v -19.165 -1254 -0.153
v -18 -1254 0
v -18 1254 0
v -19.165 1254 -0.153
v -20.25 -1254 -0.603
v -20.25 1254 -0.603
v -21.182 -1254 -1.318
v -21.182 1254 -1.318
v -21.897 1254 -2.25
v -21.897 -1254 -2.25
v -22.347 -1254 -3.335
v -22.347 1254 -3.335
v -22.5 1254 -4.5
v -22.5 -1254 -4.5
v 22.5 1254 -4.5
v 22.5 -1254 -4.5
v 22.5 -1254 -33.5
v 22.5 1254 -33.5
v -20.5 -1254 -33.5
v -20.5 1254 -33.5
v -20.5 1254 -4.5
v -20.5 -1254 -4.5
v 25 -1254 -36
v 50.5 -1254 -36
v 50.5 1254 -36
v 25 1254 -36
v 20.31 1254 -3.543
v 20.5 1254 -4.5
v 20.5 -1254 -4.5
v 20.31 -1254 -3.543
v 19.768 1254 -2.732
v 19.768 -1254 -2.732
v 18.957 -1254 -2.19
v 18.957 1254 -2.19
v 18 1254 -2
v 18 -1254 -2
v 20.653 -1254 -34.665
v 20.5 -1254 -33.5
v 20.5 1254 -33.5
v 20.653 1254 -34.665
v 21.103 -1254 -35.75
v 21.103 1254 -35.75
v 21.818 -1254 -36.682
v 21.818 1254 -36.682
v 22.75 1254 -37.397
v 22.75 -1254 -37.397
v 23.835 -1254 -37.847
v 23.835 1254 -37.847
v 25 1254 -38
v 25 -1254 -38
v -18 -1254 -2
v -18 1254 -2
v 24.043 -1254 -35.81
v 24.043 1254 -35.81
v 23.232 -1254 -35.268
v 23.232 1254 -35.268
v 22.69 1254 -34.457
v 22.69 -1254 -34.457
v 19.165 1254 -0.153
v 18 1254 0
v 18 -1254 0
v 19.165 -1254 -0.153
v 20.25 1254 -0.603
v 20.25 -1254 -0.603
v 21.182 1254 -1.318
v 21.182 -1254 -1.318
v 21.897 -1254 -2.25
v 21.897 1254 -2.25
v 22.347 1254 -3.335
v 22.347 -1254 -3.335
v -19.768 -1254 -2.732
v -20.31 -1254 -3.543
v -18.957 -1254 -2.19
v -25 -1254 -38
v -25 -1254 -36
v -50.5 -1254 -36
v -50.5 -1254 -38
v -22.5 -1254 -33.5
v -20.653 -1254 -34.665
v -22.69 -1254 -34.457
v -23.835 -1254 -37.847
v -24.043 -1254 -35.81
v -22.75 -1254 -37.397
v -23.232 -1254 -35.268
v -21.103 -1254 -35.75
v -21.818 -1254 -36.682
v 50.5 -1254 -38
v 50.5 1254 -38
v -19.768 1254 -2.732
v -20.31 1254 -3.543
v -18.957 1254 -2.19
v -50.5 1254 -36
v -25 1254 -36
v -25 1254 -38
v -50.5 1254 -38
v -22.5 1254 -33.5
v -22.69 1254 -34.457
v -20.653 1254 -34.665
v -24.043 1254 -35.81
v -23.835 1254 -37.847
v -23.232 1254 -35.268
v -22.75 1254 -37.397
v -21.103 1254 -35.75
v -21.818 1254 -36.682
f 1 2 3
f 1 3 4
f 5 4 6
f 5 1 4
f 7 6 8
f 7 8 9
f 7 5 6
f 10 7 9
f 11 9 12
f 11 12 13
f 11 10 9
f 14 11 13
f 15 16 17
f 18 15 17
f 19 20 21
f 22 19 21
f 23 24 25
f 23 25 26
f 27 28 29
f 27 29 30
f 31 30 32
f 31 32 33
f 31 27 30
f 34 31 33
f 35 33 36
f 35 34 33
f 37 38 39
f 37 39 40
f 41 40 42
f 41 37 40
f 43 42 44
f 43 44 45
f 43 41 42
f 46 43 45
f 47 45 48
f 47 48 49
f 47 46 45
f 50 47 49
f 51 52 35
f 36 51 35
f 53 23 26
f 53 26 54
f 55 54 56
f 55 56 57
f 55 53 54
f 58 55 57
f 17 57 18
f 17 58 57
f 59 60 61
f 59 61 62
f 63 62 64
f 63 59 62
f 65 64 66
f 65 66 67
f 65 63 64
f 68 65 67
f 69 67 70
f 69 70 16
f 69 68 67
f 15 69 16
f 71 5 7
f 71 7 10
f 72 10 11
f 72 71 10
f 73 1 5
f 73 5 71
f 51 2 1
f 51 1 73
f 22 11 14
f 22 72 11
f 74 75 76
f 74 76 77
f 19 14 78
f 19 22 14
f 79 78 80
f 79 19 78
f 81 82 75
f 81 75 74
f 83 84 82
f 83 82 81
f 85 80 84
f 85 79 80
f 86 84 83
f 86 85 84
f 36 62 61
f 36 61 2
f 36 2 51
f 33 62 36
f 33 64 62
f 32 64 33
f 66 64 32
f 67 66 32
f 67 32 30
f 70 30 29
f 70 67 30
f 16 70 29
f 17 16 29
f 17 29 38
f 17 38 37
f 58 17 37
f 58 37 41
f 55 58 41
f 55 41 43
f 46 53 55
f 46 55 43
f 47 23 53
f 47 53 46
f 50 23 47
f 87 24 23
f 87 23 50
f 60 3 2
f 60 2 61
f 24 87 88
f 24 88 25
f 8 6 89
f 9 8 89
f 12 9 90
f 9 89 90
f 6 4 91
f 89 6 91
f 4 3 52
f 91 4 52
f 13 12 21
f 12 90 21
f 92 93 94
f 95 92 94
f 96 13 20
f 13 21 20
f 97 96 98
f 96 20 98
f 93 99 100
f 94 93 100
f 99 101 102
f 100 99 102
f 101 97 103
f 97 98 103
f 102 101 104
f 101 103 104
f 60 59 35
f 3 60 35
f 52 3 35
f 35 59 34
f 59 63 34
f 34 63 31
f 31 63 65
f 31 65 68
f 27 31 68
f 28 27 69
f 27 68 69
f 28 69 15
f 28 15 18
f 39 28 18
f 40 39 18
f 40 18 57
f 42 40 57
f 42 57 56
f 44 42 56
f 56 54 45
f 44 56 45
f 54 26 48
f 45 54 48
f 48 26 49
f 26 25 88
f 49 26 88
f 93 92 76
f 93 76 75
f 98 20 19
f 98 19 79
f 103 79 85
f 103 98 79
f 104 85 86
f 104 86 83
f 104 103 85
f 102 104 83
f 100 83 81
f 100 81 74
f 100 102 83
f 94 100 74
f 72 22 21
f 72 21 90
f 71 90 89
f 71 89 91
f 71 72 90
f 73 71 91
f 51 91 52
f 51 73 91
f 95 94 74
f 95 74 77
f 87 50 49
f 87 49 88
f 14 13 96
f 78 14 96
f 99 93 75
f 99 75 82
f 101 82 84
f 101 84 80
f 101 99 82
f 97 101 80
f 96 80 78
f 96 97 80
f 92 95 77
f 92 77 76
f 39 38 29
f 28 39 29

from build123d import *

# Parameters (mm, degrees)
SKETCH1_W                      = 45
SKETCH1_H                      = 2508
BASE_FLANGE1_DEPTH             = 2
EDGE_FLANGE1_STRIP_W           = 13
EDGE_FLANGE1_STRIP_H           = 2
EDGE_FLANGE1_STRIP_CUT_DEPTH   = 2508
EDGE_FLANGE1_STRIP_2_W         = 13
EDGE_FLANGE1_STRIP_2_H         = 2
EDGE_FLANGE1_STRIP_CUT_2_DEPTH = 2508
EDGE_FLANGE1_DEPTH             = 2508
EDGE_FLANGE1_BEND_DEPTH        = 2508
EDGE_FLANGE2_STRIP_W           = 13
EDGE_FLANGE2_STRIP_H           = 2
EDGE_FLANGE2_STRIP_CUT_DEPTH   = 2508
EDGE_FLANGE2_STRIP_2_W         = 13
EDGE_FLANGE2_STRIP_2_H         = 2
EDGE_FLANGE2_STRIP_CUT_2_DEPTH = 2508
EDGE_FLANGE2_DEPTH             = 2508
EDGE_FLANGE2_BEND_DEPTH        = 2508


# Sheet-metal steps are written as plain solids
with BuildPart() as part:
    # Sketch1 → Base-Flange1 (new body)
    with BuildSketch(Plane.XY):
        Rectangle(SKETCH1_W, SKETCH1_H)
    extrude(amount=-BASE_FLANGE1_DEPTH)

    # Edge-Flange1 strip (across the edge) → Edge-Flange1 strip cut (cut)
    with BuildSketch(Plane(origin=(22.5, 1254, -2), x_dir=(-1, 0, 0), z_dir=(0, -1, 0))):
        with Locations((-2, -1)):
            Rectangle(EDGE_FLANGE1_STRIP_W, EDGE_FLANGE1_STRIP_H)
    extrude(amount=EDGE_FLANGE1_STRIP_CUT_DEPTH, mode=Mode.SUBTRACT)

    # Edge-Flange1 strip 2 (across the edge) → Edge-Flange1 strip cut 2 (cut)
    with BuildSketch(Plane(origin=(-22.5, -1254, -2), x_dir=(1, 0, 0), z_dir=(0, 1, 0))):
        with Locations((-2, -1)):
            Rectangle(EDGE_FLANGE1_STRIP_2_W, EDGE_FLANGE1_STRIP_2_H)
    extrude(amount=EDGE_FLANGE1_STRIP_CUT_2_DEPTH, mode=Mode.SUBTRACT)

    # Edge-Flange1 section (across the edge) → Edge-Flange1 (add)
    with BuildSketch(Plane(origin=(22.5, 1254, -2), x_dir=(-1, 0, 0), z_dir=(0, -1, 0))):
        with BuildLine():
            Line((0, 2.5), (0, 36))
            Line((0, 36), (2, 36))
            Line((2, 36), (2, 2.5))
            ThreePointArc((2, 2.5), (2.732233047, 0.732233047), (4.5, 0))
            Line((4.5, 0), (4.5, -2))
            ThreePointArc((4.5, -2), (1.318019485, -0.681980515), (0, 2.5))
        make_face()
    extrude(amount=EDGE_FLANGE1_DEPTH)

    # Edge-Flange1 section 2 (across the edge) → Edge-Flange1 bend (add)
    with BuildSketch(Plane(origin=(-22.5, -1254, -2), x_dir=(1, 0, 0), z_dir=(0, 1, 0))):
        with BuildLine():
            Line((0, 2.5), (0, 36))
            Line((0, 36), (2, 36))
            Line((2, 36), (2, 2.5))
            ThreePointArc((2, 2.5), (2.732233047, 0.732233047), (4.5, 0))
            Line((4.5, 0), (4.5, -2))
            ThreePointArc((4.5, -2), (1.318019485, -0.681980515), (0, 2.5))
        make_face()
    extrude(amount=EDGE_FLANGE1_BEND_DEPTH)

    # Edge-Flange2 strip (across the edge) → Edge-Flange2 strip cut (cut)
    with BuildSketch(Plane(origin=(-22.5, 1254, -38), x_dir=(0, 0, 1), z_dir=(0, -1, 0))):
        with Locations((-2, -1)):
            Rectangle(EDGE_FLANGE2_STRIP_W, EDGE_FLANGE2_STRIP_H)
    extrude(amount=EDGE_FLANGE2_STRIP_CUT_DEPTH, mode=Mode.SUBTRACT)

    # Edge-Flange2 strip 2 (across the edge) → Edge-Flange2 strip cut 2 (cut)
    with BuildSketch(Plane(origin=(22.5, -1254, -38), x_dir=(0, 0, 1), z_dir=(0, 1, 0))):
        with Locations((-2, -1)):
            Rectangle(EDGE_FLANGE2_STRIP_2_W, EDGE_FLANGE2_STRIP_2_H)
    extrude(amount=EDGE_FLANGE2_STRIP_CUT_2_DEPTH, mode=Mode.SUBTRACT)

    # Edge-Flange2 section (across the edge) → Edge-Flange2 (add)
    with BuildSketch(Plane(origin=(-22.5, 1254, -38), x_dir=(0, 0, 1), z_dir=(0, -1, 0))):
        with BuildLine():
            Line((0, 2.5), (0, 28))
            Line((0, 28), (2, 28))
            Line((2, 28), (2, 2.5))
            ThreePointArc((2, 2.5), (2.732233047, 0.732233047), (4.5, 0))
            Line((4.5, 0), (4.5, -2))
            ThreePointArc((4.5, -2), (1.318019485, -0.681980515), (0, 2.5))
        make_face()
    extrude(amount=EDGE_FLANGE2_DEPTH)

    # Edge-Flange2 section 2 (across the edge) → Edge-Flange2 bend (add)
    with BuildSketch(Plane(origin=(22.5, -1254, -38), x_dir=(0, 0, 1), z_dir=(0, 1, 0))):
        with BuildLine():
            Line((0, 2.5), (0, 28))
            Line((0, 28), (2, 28))
            Line((2, 28), (2, 2.5))
            ThreePointArc((2, 2.5), (2.732233047, 0.732233047), (4.5, 0))
            Line((4.5, 0), (4.5, -2))
            ThreePointArc((4.5, -2), (1.318019485, -0.681980515), (0, 2.5))
        make_face()
    extrude(amount=EDGE_FLANGE2_BEND_DEPTH)


solid = part.part
